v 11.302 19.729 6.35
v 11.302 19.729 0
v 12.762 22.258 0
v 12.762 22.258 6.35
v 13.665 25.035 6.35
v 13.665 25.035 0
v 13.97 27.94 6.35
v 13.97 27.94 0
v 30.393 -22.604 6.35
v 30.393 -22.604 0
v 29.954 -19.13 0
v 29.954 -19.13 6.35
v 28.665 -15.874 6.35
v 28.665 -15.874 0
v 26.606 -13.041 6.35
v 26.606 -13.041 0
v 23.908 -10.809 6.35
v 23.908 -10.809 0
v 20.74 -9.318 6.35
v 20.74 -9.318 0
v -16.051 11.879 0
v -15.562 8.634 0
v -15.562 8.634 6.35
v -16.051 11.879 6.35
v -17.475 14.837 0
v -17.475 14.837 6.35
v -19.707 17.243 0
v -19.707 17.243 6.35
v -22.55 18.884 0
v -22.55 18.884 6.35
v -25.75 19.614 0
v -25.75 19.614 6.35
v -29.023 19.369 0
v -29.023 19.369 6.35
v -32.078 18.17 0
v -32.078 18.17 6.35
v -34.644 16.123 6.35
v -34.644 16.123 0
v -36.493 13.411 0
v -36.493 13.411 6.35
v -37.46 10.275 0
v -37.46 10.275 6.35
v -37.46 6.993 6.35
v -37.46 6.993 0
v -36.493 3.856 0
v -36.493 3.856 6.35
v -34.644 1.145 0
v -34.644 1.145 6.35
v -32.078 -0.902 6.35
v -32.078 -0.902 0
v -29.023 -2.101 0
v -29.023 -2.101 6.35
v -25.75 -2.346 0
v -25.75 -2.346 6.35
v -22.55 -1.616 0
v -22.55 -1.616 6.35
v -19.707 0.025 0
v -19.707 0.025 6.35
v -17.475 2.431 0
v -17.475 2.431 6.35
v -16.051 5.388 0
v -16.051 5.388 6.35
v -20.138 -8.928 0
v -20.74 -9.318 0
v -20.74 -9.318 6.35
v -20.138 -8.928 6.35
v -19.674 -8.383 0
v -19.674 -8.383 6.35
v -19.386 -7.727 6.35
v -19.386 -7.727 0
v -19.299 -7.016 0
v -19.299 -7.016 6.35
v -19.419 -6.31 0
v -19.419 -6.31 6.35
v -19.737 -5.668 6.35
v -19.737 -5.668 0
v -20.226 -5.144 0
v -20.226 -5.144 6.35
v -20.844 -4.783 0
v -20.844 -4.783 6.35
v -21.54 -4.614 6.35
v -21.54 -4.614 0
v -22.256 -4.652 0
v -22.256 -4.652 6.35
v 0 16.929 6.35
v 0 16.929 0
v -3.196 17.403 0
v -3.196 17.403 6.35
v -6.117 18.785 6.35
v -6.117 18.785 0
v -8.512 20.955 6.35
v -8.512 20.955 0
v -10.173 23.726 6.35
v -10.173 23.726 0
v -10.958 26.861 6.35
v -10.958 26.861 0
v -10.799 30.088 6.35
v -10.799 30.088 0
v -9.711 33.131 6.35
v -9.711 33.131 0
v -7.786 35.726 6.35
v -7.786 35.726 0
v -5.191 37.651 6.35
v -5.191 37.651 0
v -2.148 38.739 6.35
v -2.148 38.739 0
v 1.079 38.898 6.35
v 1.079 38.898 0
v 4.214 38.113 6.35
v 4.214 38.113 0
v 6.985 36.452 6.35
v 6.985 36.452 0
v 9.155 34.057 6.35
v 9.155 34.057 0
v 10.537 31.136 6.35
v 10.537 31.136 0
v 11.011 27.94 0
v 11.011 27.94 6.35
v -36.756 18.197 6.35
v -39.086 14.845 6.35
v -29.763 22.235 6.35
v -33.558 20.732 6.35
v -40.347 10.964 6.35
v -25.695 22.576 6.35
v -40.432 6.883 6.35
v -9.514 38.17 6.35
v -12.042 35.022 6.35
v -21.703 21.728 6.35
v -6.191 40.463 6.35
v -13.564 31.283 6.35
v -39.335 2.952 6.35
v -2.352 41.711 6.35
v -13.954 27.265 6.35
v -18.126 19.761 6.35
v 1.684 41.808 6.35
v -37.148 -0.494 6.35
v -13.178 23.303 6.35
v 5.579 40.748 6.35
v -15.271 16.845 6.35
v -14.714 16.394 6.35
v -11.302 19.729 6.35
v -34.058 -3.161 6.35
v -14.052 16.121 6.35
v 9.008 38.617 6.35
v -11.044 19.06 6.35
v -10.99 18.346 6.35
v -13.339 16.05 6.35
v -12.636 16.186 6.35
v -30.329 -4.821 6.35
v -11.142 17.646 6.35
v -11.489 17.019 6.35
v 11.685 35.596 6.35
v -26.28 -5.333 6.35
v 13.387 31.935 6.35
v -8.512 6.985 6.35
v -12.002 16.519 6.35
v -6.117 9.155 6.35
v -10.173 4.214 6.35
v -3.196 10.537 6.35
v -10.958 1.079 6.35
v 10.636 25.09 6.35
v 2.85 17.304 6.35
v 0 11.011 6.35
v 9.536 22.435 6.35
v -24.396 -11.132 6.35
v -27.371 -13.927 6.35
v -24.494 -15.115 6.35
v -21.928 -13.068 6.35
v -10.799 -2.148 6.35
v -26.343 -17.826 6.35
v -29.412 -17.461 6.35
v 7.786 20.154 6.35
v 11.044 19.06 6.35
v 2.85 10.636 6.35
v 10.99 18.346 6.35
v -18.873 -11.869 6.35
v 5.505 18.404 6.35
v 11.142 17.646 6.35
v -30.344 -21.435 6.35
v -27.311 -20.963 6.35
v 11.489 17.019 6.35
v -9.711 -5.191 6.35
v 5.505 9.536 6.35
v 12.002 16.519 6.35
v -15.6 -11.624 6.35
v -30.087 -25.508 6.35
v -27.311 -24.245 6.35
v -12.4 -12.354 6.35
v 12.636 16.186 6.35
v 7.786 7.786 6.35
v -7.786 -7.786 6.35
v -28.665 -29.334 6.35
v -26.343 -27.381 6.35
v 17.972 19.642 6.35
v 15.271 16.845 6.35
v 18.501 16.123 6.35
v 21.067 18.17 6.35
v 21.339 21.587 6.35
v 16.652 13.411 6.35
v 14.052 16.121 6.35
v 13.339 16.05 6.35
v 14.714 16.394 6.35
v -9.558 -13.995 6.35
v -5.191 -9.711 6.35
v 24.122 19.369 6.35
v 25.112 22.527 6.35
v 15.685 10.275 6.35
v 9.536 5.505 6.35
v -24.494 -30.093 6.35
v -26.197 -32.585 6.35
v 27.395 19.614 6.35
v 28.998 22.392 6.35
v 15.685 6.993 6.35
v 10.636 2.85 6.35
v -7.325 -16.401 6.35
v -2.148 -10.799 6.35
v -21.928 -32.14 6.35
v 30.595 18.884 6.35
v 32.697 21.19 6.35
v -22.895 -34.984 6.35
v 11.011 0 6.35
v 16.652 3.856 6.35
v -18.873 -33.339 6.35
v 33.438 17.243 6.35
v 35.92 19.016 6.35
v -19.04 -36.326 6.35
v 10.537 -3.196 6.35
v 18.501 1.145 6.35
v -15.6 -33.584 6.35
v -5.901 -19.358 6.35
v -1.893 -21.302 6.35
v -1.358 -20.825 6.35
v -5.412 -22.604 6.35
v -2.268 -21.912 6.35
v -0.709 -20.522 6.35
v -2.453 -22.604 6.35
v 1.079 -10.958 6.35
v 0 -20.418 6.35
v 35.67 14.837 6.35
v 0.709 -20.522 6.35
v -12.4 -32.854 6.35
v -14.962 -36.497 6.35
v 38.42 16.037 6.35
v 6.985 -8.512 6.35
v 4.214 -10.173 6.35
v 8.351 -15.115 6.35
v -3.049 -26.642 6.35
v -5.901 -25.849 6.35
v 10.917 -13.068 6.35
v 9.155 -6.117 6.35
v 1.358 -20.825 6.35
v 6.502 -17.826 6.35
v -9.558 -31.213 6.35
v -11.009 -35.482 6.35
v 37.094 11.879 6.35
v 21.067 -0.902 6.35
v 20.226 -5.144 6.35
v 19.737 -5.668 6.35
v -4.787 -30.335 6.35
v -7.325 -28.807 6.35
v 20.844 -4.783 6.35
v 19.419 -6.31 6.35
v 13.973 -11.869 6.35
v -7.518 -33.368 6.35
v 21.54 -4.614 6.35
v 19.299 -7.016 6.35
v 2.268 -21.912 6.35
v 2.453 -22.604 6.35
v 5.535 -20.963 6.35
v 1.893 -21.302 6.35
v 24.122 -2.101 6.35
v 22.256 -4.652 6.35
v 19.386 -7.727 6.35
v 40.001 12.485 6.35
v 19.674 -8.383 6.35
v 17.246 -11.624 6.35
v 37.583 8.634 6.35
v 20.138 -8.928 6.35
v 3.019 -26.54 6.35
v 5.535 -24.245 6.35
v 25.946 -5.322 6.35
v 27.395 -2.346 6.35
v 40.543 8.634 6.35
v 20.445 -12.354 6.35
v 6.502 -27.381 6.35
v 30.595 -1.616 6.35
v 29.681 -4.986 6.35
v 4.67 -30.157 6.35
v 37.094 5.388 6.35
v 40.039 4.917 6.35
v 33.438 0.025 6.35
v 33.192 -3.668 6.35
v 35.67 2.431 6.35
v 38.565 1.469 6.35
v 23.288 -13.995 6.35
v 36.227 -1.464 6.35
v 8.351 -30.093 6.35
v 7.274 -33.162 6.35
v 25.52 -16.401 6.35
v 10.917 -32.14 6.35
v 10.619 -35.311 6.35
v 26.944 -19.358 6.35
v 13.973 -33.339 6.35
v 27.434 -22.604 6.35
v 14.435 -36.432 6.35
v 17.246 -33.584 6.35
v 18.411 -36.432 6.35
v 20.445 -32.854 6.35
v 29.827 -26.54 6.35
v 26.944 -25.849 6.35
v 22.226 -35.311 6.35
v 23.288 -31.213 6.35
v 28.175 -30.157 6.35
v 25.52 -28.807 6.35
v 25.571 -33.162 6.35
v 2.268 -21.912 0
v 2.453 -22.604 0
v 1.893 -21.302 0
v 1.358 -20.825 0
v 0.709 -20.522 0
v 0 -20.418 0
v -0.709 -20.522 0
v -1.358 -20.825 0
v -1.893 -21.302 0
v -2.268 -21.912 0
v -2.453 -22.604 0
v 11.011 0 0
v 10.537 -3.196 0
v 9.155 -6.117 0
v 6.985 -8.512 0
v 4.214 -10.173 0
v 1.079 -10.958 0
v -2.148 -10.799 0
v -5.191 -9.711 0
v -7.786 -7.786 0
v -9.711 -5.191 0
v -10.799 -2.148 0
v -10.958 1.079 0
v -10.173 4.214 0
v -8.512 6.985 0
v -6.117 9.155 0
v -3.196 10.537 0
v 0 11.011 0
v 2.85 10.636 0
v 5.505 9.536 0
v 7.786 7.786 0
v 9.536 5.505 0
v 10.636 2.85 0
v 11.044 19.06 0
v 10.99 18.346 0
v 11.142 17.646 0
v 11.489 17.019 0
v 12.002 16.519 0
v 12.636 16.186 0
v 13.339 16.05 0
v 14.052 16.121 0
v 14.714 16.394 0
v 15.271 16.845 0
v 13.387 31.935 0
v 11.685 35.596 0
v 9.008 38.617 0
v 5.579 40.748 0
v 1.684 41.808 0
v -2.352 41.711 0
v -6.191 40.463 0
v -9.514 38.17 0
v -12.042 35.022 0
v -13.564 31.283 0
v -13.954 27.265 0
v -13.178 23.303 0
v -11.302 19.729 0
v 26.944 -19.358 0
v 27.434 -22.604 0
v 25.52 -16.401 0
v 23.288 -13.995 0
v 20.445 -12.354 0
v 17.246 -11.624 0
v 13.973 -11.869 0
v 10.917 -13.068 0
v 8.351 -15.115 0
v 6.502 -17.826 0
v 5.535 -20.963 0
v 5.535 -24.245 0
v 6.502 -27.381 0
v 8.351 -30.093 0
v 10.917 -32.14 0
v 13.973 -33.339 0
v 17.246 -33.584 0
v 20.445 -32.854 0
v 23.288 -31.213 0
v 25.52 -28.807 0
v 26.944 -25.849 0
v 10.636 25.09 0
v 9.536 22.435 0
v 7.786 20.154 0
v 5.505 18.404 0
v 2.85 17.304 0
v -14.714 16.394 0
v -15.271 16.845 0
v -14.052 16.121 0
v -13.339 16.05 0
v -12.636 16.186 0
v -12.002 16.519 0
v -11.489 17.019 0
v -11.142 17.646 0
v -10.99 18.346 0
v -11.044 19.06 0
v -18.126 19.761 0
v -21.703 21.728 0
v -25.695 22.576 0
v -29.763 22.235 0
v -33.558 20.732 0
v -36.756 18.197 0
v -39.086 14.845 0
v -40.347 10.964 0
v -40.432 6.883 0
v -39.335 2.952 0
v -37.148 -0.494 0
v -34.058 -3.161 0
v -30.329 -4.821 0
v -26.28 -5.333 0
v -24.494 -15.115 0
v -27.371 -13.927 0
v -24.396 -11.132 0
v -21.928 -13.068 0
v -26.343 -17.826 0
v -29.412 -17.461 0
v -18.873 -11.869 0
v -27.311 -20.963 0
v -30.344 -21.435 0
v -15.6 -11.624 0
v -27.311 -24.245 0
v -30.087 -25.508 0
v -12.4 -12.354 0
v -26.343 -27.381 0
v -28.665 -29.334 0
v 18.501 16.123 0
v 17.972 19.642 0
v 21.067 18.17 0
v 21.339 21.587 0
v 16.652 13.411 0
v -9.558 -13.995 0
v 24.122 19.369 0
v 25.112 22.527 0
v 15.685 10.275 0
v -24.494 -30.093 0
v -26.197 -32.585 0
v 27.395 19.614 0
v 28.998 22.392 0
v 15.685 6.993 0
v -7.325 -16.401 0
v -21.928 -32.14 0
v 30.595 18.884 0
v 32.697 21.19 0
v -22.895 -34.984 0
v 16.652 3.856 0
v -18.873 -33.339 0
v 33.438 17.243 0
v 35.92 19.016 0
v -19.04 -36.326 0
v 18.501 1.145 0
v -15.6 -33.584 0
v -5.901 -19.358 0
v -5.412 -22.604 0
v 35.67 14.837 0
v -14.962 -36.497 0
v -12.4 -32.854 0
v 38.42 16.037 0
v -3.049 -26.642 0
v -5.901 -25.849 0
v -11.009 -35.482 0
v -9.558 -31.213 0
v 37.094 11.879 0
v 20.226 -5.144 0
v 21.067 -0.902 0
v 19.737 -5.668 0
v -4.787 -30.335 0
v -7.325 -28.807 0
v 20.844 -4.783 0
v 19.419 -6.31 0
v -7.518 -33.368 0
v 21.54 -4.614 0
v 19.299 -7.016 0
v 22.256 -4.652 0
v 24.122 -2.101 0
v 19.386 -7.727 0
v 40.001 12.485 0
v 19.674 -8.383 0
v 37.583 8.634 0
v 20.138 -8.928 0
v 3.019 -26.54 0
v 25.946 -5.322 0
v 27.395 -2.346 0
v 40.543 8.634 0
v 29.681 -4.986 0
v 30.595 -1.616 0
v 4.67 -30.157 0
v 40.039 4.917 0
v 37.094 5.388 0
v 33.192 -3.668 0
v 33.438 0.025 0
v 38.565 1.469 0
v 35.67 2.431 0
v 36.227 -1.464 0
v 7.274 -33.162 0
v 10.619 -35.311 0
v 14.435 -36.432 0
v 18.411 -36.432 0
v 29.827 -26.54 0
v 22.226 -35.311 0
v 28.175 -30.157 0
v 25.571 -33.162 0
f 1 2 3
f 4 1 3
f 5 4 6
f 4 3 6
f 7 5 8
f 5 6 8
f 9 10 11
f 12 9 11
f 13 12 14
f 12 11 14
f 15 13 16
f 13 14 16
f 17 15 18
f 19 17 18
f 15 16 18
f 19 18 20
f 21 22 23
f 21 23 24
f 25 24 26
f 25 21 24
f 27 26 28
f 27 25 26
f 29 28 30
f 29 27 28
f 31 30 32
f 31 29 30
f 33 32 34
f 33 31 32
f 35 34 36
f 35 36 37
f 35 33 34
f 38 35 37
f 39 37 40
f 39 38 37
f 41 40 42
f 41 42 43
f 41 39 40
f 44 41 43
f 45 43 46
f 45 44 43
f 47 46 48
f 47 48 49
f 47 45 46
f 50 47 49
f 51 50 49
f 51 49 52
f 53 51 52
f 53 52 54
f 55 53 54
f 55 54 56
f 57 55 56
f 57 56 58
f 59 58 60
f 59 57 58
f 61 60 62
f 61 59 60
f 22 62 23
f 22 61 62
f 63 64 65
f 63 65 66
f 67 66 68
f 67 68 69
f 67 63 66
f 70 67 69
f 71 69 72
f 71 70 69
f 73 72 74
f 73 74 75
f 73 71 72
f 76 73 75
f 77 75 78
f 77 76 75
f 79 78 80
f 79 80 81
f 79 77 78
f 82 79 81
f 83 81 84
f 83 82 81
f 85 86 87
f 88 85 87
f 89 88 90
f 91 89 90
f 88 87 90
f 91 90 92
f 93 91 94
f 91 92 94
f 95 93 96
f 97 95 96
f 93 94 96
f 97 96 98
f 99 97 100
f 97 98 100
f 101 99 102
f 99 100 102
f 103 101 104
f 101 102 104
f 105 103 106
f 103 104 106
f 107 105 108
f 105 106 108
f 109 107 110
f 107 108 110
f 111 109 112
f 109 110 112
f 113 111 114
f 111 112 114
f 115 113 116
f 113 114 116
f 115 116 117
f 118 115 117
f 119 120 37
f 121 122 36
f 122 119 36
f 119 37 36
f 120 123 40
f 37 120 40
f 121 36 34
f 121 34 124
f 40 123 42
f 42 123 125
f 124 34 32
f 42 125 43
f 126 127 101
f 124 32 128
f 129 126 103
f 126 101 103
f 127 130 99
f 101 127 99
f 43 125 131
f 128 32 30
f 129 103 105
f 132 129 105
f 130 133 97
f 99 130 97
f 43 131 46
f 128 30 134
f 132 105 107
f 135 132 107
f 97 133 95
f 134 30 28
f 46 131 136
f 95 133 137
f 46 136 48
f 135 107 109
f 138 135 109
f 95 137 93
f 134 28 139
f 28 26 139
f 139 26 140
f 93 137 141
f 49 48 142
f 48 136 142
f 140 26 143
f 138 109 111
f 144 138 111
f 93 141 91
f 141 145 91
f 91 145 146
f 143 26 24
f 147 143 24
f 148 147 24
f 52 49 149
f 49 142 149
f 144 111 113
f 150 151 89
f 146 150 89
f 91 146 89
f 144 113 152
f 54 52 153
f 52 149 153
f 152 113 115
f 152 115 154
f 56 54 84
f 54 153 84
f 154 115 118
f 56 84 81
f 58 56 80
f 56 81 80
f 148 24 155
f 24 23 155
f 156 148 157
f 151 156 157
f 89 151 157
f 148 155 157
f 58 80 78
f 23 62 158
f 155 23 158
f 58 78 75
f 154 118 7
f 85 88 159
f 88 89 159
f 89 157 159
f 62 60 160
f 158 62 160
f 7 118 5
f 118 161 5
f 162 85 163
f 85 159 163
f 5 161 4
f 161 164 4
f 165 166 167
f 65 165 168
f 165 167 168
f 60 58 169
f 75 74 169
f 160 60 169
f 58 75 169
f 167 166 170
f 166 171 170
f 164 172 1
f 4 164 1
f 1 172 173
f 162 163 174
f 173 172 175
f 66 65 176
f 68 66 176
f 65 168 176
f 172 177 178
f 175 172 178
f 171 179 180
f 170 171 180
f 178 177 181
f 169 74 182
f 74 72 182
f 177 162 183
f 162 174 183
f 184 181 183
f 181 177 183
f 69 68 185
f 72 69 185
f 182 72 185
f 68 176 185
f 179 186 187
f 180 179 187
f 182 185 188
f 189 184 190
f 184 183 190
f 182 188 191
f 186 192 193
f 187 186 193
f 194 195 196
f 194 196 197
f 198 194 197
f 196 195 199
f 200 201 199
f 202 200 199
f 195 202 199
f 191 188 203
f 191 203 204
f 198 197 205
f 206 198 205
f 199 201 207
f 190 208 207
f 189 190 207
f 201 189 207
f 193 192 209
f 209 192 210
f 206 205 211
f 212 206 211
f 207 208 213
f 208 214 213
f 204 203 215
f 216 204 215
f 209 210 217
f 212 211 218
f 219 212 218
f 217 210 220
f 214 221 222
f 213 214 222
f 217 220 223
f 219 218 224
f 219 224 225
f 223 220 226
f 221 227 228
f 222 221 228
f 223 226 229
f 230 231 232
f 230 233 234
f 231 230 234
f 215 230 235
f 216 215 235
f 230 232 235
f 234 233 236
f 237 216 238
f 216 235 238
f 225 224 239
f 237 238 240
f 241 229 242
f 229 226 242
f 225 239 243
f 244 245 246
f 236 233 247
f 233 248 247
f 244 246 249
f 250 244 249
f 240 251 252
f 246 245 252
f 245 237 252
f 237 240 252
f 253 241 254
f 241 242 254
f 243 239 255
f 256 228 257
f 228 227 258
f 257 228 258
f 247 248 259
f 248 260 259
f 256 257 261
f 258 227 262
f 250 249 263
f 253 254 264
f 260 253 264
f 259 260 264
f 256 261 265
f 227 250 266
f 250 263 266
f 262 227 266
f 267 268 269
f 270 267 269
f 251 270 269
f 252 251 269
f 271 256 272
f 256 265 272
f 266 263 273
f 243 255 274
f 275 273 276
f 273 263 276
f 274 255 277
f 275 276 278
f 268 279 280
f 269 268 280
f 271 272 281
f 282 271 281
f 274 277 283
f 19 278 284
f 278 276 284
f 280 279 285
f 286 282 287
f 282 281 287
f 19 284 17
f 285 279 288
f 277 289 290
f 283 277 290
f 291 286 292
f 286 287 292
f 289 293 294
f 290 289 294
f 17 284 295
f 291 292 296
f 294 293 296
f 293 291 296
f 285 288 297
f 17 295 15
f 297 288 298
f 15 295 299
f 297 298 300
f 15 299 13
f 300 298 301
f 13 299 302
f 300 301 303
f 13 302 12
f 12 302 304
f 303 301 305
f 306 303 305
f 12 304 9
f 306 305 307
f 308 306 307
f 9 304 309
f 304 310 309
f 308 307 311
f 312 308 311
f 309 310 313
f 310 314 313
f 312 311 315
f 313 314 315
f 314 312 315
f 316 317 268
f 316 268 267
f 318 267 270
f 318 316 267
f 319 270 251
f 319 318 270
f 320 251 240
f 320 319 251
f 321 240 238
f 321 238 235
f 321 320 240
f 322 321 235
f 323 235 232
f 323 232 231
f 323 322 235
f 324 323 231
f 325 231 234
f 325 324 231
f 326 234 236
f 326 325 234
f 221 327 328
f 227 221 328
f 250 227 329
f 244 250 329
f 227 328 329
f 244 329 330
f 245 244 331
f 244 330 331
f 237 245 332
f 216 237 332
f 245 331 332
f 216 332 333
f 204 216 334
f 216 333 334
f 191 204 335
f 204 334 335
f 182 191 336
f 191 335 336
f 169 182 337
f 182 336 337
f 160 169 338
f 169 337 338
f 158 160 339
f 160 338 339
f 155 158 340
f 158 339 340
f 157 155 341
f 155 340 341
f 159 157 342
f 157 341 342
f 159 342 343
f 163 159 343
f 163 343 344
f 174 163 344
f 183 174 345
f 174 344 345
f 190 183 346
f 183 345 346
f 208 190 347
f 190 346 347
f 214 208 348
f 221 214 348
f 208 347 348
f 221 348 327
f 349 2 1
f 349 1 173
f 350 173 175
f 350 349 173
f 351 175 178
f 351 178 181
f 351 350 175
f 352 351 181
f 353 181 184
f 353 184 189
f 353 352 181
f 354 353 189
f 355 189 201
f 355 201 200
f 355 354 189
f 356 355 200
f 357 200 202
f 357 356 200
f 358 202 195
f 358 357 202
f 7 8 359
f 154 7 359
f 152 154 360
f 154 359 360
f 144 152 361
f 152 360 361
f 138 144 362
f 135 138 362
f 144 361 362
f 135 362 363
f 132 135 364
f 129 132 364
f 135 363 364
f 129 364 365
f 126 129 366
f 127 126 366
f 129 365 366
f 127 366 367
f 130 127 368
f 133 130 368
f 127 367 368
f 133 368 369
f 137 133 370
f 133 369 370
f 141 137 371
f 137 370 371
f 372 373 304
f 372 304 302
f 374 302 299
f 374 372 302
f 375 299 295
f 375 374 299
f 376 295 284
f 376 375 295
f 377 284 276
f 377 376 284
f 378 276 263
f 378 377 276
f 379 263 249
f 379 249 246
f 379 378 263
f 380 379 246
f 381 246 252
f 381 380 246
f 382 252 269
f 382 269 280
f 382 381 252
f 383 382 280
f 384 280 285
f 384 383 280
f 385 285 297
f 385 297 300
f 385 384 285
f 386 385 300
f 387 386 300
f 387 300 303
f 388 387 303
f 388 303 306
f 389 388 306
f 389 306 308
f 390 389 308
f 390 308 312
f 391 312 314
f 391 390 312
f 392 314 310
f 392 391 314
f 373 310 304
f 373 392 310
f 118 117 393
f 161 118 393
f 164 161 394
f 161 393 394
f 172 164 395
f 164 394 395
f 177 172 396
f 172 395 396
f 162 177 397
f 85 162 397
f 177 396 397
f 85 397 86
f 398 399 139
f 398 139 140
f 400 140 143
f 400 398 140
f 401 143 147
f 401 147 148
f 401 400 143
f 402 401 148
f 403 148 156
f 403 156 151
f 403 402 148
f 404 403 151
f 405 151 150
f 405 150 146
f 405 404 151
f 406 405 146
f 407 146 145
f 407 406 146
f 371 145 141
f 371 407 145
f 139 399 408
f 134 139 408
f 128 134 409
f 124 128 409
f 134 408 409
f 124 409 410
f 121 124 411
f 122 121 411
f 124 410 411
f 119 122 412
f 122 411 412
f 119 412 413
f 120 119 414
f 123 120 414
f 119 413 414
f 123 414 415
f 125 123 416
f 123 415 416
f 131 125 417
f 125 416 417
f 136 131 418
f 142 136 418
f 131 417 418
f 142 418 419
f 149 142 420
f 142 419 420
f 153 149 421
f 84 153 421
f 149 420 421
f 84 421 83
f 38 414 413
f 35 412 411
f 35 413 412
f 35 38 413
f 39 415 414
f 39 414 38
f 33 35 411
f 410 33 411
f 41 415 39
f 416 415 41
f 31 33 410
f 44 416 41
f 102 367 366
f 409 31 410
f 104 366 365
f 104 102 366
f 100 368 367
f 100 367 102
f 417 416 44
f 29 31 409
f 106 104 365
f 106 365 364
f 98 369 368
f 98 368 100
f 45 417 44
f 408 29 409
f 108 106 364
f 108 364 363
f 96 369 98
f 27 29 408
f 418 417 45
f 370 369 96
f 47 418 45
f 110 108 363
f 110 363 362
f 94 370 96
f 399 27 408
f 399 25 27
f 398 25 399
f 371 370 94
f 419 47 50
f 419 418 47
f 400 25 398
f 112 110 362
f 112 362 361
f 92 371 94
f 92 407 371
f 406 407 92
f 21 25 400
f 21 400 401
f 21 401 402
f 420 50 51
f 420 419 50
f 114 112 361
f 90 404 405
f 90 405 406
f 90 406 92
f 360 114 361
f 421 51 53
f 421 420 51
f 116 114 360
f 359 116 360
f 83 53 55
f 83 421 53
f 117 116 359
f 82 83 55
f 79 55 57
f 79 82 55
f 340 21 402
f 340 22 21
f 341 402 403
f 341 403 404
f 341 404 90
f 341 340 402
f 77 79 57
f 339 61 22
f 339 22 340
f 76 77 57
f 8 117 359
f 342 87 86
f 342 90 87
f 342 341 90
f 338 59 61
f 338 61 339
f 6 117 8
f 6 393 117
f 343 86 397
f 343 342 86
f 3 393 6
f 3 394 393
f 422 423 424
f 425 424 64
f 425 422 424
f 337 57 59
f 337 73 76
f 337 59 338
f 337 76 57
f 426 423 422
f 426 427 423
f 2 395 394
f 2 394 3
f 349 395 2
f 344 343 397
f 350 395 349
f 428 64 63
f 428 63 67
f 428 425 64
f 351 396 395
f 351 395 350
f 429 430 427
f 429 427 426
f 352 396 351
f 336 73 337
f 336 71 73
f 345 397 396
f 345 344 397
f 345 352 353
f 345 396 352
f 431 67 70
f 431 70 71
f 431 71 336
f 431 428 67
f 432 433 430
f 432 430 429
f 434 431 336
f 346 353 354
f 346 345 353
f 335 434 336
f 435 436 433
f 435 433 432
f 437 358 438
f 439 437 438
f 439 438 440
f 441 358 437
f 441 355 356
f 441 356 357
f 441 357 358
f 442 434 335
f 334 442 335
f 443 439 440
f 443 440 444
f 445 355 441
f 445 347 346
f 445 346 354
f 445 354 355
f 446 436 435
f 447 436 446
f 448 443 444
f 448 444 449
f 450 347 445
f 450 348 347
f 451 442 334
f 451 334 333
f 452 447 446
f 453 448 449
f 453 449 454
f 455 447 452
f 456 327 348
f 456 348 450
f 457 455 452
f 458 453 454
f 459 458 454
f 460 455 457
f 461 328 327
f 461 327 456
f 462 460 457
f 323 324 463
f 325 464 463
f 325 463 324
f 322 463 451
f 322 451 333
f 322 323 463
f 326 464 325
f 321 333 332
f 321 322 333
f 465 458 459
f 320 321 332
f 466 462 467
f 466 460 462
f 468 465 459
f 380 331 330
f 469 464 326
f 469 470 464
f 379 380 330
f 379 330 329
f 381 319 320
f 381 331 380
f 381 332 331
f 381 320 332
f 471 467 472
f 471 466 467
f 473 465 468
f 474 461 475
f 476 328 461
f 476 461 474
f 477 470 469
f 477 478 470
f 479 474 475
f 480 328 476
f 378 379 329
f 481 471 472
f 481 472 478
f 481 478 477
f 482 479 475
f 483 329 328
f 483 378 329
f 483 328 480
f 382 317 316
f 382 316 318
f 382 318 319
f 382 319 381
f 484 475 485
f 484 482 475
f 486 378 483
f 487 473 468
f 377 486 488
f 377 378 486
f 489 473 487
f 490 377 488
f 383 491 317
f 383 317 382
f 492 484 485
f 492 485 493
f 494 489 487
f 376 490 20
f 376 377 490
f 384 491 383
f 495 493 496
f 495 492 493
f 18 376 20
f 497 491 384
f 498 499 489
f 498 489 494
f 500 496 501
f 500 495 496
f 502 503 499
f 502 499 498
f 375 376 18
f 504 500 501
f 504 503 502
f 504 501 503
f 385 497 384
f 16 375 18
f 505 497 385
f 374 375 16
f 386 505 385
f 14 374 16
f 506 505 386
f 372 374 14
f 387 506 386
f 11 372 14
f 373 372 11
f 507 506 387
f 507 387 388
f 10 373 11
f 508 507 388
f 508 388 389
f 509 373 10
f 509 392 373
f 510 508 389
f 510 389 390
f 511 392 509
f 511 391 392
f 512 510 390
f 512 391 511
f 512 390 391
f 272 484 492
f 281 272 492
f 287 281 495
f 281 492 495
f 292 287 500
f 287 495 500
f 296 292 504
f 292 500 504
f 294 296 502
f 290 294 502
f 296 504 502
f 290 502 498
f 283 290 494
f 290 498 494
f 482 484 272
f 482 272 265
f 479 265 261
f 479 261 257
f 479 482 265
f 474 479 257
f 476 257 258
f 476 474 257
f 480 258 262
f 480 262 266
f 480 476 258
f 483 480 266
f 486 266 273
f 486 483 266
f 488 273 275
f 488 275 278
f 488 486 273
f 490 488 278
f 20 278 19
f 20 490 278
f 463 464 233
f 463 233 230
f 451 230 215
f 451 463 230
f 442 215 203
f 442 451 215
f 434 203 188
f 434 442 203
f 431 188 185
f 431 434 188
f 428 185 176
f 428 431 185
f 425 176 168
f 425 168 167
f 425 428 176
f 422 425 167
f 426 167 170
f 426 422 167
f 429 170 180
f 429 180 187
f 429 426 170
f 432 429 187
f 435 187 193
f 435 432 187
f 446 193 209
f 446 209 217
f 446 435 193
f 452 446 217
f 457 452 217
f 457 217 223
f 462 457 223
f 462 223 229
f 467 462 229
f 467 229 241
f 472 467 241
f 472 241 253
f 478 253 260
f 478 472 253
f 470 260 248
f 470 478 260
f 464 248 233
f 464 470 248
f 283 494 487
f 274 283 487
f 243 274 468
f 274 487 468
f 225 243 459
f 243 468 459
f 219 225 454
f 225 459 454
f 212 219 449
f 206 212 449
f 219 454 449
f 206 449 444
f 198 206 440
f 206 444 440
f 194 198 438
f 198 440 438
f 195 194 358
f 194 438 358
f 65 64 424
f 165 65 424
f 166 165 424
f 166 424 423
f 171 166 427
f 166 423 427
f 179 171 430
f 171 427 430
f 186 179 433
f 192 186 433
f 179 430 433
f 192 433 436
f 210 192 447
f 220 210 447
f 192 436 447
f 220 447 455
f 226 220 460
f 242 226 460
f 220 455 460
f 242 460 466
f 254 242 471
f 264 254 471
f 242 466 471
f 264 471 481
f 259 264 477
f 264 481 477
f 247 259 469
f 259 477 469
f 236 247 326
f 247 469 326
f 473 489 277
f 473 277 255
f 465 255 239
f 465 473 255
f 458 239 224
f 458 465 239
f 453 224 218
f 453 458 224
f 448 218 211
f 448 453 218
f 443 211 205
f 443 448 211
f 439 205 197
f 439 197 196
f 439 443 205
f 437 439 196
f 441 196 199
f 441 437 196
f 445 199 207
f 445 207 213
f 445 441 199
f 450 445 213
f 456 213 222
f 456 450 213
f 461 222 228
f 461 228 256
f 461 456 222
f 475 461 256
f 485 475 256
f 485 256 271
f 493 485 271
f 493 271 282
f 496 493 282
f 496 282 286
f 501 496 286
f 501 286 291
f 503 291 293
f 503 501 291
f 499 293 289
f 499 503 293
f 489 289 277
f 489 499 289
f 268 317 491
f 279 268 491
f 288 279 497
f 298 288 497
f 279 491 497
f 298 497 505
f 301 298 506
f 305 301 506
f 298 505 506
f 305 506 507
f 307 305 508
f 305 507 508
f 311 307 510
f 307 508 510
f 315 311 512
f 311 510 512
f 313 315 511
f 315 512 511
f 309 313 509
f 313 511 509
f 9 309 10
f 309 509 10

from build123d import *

# Parameters (mm, degrees)
F0_R     = 11.0109
F1_DEPTH = 6.35
F3_DEPTH = 6.35


with BuildPart() as f1:
    # F0 (on Top) → F1 (new body)
    with BuildSketch(Plane.XY):
        with BuildLine():
            ThreePointArc((-12.6025190653, 8.6339348228), (-40.3705251806, 10.8193243169), (-13.2862595435, 4.3169673779))
            ThreePointArc((-13.2862595435, 4.3169673779), (-12.7745129499, 6.4485453288), (-12.6025190653, 8.6339348228))
        make_face()
        with Locations((-26.5725190653, 8.6339348228)):
            Circle(F0_R, mode=Mode.SUBTRACT)
    extrude(amount=F1_DEPTH)



with BuildPart() as f1b:
    # F0 (on Top) → F1, piece 2 (new body)
    with BuildSketch(Plane.XY):
        with BuildLine():
            ThreePointArc((13.97, 27.94), (-9.8782817326, 37.8182817338), (-1.8e-09, 13.97))
            ThreePointArc((-1.8e-09, 13.97), (9.8782817326, 18.0617182662), (13.97, 27.94))
        make_face()
        with BuildLine():
            ThreePointArc((11.0109, 27.94), (7.785882057, 20.154117943), (0, 16.9291))
            ThreePointArc((0, 16.9291), (-7.785882057, 35.725882057), (11.0109, 27.94))
        make_face(mode=Mode.SUBTRACT)
    extrude(amount=F1_DEPTH)


with BuildPart() as f1c:
    # F0 (on Top) → F1, piece 3 (new body)
    with BuildSketch(Plane.XY):
        with BuildLine():
            ThreePointArc((40.5425190653, 8.6339348228), (24.387129585, 22.4319409404), (13.2862595349, 4.3169674044))
            ThreePointArc((13.2862595349, 4.3169674044), (28.7579085455, -5.1640712947), (40.5425190653, 8.6339348228))
        make_face()
        with Locations((26.5725190653, 8.6339348228)):
            Circle(F0_R, mode=Mode.SUBTRACT)
    extrude(amount=F1_DEPTH)


with BuildPart() as f1d:
    # F0 (on Top) → F1, piece 4 (new body)
    with BuildSketch(Plane.XY):
        with BuildLine():
            ThreePointArc((30.3927199491, -22.6039348228), (22.7649672257, -10.1565736775), (8.2113599659, -11.3019674177))
            ThreePointArc((8.2113599659, -11.3019674177), (10.0804726724, -35.0512959682), (30.3927199491, -22.6039348228))
        make_face()
        with Locations((16.4227199491, -22.6039348228)):
            Circle(F0_R, mode=Mode.SUBTRACT)
    extrude(amount=F1_DEPTH)


with BuildPart() as f1e:
    # F0 (on Top) → F1, piece 5 (new body)
    with BuildSketch(Plane.XY):
        with BuildLine():
            ThreePointArc((-2.4527199491, -22.6039348228), (-3.9753588409, -16.2616874733), (-8.2113600984, -11.3019673214))
            ThreePointArc((-8.2113600984, -11.3019673214), (-28.8700810572, -28.9461821724), (-2.4527199491, -22.6039348228))
        make_face()
        with Locations((-16.4227199491, -22.6039348228)):
            Circle(F0_R, mode=Mode.SUBTRACT)
    extrude(amount=F1_DEPTH)


with BuildPart() as f1f:
    # F0 (on Top) → F1, piece 6 (new body)
    with BuildSketch(Plane.XY):
        with BuildLine():
            ThreePointArc((13.2862595349, 4.3169674044), (8.2113599768, 11.3019674098), (-1.8e-09, 13.97))
            ThreePointArc((-1.8e-09, 13.97), (-8.2113599895, 11.3019674005), (-13.2862595435, 4.3169673779))
            ThreePointArc((-13.2862595435, 4.3169673779), (-13.2862595509, -4.3169673554), (-8.2113600984, -11.3019673214))
            ThreePointArc((-8.2113600984, -11.3019673214), (-8.19e-08, -13.97), (8.2113599659, -11.3019674177))
            ThreePointArc((8.2113599659, -11.3019674177), (12.4473611405, -6.3422472861), (13.97, 0))
            ThreePointArc((13.97, 0), (13.7980061187, 2.185389473), (13.2862595349, 4.3169674044))
        make_face()
        with BuildLine():
            ThreePointArc((0, 11.0109), (7.785882057, 7.785882057), (11.0109, 0))
            ThreePointArc((11.0109, 0), (-7.785882057, -7.785882057), (0, 11.0109))
        make_face(mode=Mode.SUBTRACT)
    extrude(amount=F1_DEPTH)


with BuildPart() as f1_1:
    add(f1.part)

    add(f1b.part)  # F3 merges F1b

    add(f1c.part)  # F3 merges F1c

    add(f1d.part)  # F3 merges F1d

    add(f1e.part)  # F3 merges F1e

    add(f1f.part)  # F3 merges F1f
    # F2 (on face) → F3 (join)
    with BuildSketch(Plane(origin=(0, 0, 0), x_dir=(1, 0, 0), z_dir=(0, 0, -1))):
        with BuildLine():
            ThreePointArc((2.4527199491, 22.6039348228), (0, 20.4182749221), (-2.4527199491, 22.6039348228))
            ThreePointArc((-2.4527199491, 22.6039348228), (-3.9753588004, 16.2616875527), (-8.2113599542, 11.3019674262))
            ThreePointArc((-8.2113599542, 11.3019674262), (-1.7e-08, 13.97), (8.2113599266, 11.3019674462))
            ThreePointArc((8.2113599266, 11.3019674462), (3.9753587927, 16.2616875678), (2.4527199491, 22.6039348228))
        make_face()
        with BuildLine():
            ThreePointArc((-8.2113599542, 11.3019674262), (-14.23733046, 8.8059287067), (-20.7396873605, 9.3176752902))
            ThreePointArc((-20.7396873605, 9.3176752902), (-19.4189334161, 6.3095939467), (-22.2555516539, 4.6523247098))
            ThreePointArc((-22.2555516539, 4.6523247098), (-16.6942373027, 1.2443468809), (-13.286259507, -4.3169674905))
            ThreePointArc((-13.286259507, -4.3169674905), (-13.2862595416, 4.3169673838), (-8.2113599542, 11.3019674262))
        make_face()
        with BuildLine():
            ThreePointArc((-7.22e-08, -13.97), (-8.2113599701, -11.3019674146), (-13.286259507, -4.3169674905))
            ThreePointArc((-13.286259507, -4.3169674905), (-12.7745129407, -6.4485453873), (-12.6025190653, -8.6339348228))
            ThreePointArc((-12.6025190653, -8.6339348228), (-13.2862595326, -12.9509022343), (-15.2705516539, -16.8452947974))
            ThreePointArc((-15.2705516539, -16.8452947974), (-12.0015608764, -16.5187314078), (-11.3019674114, -19.7286400255))
            ThreePointArc((-11.3019674114, -19.7286400255), (-6.3422473135, -15.4926388735), (-7.22e-08, -13.97))
        make_face()
        with BuildLine():
            ThreePointArc((13.2862595349, -4.3169674044), (8.2113599483, -11.3019674305), (-7.22e-08, -13.97))
            ThreePointArc((-7.22e-08, -13.97), (6.3422472492, -15.4926388407), (11.3019674114, -19.7286400255))
            ThreePointArc((11.3019674114, -19.7286400255), (12.0015608764, -16.5187314078), (15.2705516539, -16.8452947974))
            ThreePointArc((15.2705516539, -16.8452947974), (12.7745129466, -10.8193242958), (13.2862595349, -4.3169674044))
        make_face()
        with BuildLine():
            ThreePointArc((20.7396873605, 9.3176752902), (14.2373304432, 8.8059287094), (8.2113599266, 11.3019674462))
            ThreePointArc((8.2113599266, 11.3019674462), (12.4473611295, 6.3422473077), (13.97, 0))
            ThreePointArc((13.97, 0), (13.7980061187, -2.185389473), (13.2862595349, -4.3169674044))
            ThreePointArc((13.2862595349, -4.3169674044), (16.6942373347, 1.2443469129), (22.2555516539, 4.6523247098))
            ThreePointArc((22.2555516539, 4.6523247098), (19.4189334161, 6.3095939467), (20.7396873605, 9.3176752902))
        make_face()
    extrude(amount=-F3_DEPTH)


solid = f1_1.part
